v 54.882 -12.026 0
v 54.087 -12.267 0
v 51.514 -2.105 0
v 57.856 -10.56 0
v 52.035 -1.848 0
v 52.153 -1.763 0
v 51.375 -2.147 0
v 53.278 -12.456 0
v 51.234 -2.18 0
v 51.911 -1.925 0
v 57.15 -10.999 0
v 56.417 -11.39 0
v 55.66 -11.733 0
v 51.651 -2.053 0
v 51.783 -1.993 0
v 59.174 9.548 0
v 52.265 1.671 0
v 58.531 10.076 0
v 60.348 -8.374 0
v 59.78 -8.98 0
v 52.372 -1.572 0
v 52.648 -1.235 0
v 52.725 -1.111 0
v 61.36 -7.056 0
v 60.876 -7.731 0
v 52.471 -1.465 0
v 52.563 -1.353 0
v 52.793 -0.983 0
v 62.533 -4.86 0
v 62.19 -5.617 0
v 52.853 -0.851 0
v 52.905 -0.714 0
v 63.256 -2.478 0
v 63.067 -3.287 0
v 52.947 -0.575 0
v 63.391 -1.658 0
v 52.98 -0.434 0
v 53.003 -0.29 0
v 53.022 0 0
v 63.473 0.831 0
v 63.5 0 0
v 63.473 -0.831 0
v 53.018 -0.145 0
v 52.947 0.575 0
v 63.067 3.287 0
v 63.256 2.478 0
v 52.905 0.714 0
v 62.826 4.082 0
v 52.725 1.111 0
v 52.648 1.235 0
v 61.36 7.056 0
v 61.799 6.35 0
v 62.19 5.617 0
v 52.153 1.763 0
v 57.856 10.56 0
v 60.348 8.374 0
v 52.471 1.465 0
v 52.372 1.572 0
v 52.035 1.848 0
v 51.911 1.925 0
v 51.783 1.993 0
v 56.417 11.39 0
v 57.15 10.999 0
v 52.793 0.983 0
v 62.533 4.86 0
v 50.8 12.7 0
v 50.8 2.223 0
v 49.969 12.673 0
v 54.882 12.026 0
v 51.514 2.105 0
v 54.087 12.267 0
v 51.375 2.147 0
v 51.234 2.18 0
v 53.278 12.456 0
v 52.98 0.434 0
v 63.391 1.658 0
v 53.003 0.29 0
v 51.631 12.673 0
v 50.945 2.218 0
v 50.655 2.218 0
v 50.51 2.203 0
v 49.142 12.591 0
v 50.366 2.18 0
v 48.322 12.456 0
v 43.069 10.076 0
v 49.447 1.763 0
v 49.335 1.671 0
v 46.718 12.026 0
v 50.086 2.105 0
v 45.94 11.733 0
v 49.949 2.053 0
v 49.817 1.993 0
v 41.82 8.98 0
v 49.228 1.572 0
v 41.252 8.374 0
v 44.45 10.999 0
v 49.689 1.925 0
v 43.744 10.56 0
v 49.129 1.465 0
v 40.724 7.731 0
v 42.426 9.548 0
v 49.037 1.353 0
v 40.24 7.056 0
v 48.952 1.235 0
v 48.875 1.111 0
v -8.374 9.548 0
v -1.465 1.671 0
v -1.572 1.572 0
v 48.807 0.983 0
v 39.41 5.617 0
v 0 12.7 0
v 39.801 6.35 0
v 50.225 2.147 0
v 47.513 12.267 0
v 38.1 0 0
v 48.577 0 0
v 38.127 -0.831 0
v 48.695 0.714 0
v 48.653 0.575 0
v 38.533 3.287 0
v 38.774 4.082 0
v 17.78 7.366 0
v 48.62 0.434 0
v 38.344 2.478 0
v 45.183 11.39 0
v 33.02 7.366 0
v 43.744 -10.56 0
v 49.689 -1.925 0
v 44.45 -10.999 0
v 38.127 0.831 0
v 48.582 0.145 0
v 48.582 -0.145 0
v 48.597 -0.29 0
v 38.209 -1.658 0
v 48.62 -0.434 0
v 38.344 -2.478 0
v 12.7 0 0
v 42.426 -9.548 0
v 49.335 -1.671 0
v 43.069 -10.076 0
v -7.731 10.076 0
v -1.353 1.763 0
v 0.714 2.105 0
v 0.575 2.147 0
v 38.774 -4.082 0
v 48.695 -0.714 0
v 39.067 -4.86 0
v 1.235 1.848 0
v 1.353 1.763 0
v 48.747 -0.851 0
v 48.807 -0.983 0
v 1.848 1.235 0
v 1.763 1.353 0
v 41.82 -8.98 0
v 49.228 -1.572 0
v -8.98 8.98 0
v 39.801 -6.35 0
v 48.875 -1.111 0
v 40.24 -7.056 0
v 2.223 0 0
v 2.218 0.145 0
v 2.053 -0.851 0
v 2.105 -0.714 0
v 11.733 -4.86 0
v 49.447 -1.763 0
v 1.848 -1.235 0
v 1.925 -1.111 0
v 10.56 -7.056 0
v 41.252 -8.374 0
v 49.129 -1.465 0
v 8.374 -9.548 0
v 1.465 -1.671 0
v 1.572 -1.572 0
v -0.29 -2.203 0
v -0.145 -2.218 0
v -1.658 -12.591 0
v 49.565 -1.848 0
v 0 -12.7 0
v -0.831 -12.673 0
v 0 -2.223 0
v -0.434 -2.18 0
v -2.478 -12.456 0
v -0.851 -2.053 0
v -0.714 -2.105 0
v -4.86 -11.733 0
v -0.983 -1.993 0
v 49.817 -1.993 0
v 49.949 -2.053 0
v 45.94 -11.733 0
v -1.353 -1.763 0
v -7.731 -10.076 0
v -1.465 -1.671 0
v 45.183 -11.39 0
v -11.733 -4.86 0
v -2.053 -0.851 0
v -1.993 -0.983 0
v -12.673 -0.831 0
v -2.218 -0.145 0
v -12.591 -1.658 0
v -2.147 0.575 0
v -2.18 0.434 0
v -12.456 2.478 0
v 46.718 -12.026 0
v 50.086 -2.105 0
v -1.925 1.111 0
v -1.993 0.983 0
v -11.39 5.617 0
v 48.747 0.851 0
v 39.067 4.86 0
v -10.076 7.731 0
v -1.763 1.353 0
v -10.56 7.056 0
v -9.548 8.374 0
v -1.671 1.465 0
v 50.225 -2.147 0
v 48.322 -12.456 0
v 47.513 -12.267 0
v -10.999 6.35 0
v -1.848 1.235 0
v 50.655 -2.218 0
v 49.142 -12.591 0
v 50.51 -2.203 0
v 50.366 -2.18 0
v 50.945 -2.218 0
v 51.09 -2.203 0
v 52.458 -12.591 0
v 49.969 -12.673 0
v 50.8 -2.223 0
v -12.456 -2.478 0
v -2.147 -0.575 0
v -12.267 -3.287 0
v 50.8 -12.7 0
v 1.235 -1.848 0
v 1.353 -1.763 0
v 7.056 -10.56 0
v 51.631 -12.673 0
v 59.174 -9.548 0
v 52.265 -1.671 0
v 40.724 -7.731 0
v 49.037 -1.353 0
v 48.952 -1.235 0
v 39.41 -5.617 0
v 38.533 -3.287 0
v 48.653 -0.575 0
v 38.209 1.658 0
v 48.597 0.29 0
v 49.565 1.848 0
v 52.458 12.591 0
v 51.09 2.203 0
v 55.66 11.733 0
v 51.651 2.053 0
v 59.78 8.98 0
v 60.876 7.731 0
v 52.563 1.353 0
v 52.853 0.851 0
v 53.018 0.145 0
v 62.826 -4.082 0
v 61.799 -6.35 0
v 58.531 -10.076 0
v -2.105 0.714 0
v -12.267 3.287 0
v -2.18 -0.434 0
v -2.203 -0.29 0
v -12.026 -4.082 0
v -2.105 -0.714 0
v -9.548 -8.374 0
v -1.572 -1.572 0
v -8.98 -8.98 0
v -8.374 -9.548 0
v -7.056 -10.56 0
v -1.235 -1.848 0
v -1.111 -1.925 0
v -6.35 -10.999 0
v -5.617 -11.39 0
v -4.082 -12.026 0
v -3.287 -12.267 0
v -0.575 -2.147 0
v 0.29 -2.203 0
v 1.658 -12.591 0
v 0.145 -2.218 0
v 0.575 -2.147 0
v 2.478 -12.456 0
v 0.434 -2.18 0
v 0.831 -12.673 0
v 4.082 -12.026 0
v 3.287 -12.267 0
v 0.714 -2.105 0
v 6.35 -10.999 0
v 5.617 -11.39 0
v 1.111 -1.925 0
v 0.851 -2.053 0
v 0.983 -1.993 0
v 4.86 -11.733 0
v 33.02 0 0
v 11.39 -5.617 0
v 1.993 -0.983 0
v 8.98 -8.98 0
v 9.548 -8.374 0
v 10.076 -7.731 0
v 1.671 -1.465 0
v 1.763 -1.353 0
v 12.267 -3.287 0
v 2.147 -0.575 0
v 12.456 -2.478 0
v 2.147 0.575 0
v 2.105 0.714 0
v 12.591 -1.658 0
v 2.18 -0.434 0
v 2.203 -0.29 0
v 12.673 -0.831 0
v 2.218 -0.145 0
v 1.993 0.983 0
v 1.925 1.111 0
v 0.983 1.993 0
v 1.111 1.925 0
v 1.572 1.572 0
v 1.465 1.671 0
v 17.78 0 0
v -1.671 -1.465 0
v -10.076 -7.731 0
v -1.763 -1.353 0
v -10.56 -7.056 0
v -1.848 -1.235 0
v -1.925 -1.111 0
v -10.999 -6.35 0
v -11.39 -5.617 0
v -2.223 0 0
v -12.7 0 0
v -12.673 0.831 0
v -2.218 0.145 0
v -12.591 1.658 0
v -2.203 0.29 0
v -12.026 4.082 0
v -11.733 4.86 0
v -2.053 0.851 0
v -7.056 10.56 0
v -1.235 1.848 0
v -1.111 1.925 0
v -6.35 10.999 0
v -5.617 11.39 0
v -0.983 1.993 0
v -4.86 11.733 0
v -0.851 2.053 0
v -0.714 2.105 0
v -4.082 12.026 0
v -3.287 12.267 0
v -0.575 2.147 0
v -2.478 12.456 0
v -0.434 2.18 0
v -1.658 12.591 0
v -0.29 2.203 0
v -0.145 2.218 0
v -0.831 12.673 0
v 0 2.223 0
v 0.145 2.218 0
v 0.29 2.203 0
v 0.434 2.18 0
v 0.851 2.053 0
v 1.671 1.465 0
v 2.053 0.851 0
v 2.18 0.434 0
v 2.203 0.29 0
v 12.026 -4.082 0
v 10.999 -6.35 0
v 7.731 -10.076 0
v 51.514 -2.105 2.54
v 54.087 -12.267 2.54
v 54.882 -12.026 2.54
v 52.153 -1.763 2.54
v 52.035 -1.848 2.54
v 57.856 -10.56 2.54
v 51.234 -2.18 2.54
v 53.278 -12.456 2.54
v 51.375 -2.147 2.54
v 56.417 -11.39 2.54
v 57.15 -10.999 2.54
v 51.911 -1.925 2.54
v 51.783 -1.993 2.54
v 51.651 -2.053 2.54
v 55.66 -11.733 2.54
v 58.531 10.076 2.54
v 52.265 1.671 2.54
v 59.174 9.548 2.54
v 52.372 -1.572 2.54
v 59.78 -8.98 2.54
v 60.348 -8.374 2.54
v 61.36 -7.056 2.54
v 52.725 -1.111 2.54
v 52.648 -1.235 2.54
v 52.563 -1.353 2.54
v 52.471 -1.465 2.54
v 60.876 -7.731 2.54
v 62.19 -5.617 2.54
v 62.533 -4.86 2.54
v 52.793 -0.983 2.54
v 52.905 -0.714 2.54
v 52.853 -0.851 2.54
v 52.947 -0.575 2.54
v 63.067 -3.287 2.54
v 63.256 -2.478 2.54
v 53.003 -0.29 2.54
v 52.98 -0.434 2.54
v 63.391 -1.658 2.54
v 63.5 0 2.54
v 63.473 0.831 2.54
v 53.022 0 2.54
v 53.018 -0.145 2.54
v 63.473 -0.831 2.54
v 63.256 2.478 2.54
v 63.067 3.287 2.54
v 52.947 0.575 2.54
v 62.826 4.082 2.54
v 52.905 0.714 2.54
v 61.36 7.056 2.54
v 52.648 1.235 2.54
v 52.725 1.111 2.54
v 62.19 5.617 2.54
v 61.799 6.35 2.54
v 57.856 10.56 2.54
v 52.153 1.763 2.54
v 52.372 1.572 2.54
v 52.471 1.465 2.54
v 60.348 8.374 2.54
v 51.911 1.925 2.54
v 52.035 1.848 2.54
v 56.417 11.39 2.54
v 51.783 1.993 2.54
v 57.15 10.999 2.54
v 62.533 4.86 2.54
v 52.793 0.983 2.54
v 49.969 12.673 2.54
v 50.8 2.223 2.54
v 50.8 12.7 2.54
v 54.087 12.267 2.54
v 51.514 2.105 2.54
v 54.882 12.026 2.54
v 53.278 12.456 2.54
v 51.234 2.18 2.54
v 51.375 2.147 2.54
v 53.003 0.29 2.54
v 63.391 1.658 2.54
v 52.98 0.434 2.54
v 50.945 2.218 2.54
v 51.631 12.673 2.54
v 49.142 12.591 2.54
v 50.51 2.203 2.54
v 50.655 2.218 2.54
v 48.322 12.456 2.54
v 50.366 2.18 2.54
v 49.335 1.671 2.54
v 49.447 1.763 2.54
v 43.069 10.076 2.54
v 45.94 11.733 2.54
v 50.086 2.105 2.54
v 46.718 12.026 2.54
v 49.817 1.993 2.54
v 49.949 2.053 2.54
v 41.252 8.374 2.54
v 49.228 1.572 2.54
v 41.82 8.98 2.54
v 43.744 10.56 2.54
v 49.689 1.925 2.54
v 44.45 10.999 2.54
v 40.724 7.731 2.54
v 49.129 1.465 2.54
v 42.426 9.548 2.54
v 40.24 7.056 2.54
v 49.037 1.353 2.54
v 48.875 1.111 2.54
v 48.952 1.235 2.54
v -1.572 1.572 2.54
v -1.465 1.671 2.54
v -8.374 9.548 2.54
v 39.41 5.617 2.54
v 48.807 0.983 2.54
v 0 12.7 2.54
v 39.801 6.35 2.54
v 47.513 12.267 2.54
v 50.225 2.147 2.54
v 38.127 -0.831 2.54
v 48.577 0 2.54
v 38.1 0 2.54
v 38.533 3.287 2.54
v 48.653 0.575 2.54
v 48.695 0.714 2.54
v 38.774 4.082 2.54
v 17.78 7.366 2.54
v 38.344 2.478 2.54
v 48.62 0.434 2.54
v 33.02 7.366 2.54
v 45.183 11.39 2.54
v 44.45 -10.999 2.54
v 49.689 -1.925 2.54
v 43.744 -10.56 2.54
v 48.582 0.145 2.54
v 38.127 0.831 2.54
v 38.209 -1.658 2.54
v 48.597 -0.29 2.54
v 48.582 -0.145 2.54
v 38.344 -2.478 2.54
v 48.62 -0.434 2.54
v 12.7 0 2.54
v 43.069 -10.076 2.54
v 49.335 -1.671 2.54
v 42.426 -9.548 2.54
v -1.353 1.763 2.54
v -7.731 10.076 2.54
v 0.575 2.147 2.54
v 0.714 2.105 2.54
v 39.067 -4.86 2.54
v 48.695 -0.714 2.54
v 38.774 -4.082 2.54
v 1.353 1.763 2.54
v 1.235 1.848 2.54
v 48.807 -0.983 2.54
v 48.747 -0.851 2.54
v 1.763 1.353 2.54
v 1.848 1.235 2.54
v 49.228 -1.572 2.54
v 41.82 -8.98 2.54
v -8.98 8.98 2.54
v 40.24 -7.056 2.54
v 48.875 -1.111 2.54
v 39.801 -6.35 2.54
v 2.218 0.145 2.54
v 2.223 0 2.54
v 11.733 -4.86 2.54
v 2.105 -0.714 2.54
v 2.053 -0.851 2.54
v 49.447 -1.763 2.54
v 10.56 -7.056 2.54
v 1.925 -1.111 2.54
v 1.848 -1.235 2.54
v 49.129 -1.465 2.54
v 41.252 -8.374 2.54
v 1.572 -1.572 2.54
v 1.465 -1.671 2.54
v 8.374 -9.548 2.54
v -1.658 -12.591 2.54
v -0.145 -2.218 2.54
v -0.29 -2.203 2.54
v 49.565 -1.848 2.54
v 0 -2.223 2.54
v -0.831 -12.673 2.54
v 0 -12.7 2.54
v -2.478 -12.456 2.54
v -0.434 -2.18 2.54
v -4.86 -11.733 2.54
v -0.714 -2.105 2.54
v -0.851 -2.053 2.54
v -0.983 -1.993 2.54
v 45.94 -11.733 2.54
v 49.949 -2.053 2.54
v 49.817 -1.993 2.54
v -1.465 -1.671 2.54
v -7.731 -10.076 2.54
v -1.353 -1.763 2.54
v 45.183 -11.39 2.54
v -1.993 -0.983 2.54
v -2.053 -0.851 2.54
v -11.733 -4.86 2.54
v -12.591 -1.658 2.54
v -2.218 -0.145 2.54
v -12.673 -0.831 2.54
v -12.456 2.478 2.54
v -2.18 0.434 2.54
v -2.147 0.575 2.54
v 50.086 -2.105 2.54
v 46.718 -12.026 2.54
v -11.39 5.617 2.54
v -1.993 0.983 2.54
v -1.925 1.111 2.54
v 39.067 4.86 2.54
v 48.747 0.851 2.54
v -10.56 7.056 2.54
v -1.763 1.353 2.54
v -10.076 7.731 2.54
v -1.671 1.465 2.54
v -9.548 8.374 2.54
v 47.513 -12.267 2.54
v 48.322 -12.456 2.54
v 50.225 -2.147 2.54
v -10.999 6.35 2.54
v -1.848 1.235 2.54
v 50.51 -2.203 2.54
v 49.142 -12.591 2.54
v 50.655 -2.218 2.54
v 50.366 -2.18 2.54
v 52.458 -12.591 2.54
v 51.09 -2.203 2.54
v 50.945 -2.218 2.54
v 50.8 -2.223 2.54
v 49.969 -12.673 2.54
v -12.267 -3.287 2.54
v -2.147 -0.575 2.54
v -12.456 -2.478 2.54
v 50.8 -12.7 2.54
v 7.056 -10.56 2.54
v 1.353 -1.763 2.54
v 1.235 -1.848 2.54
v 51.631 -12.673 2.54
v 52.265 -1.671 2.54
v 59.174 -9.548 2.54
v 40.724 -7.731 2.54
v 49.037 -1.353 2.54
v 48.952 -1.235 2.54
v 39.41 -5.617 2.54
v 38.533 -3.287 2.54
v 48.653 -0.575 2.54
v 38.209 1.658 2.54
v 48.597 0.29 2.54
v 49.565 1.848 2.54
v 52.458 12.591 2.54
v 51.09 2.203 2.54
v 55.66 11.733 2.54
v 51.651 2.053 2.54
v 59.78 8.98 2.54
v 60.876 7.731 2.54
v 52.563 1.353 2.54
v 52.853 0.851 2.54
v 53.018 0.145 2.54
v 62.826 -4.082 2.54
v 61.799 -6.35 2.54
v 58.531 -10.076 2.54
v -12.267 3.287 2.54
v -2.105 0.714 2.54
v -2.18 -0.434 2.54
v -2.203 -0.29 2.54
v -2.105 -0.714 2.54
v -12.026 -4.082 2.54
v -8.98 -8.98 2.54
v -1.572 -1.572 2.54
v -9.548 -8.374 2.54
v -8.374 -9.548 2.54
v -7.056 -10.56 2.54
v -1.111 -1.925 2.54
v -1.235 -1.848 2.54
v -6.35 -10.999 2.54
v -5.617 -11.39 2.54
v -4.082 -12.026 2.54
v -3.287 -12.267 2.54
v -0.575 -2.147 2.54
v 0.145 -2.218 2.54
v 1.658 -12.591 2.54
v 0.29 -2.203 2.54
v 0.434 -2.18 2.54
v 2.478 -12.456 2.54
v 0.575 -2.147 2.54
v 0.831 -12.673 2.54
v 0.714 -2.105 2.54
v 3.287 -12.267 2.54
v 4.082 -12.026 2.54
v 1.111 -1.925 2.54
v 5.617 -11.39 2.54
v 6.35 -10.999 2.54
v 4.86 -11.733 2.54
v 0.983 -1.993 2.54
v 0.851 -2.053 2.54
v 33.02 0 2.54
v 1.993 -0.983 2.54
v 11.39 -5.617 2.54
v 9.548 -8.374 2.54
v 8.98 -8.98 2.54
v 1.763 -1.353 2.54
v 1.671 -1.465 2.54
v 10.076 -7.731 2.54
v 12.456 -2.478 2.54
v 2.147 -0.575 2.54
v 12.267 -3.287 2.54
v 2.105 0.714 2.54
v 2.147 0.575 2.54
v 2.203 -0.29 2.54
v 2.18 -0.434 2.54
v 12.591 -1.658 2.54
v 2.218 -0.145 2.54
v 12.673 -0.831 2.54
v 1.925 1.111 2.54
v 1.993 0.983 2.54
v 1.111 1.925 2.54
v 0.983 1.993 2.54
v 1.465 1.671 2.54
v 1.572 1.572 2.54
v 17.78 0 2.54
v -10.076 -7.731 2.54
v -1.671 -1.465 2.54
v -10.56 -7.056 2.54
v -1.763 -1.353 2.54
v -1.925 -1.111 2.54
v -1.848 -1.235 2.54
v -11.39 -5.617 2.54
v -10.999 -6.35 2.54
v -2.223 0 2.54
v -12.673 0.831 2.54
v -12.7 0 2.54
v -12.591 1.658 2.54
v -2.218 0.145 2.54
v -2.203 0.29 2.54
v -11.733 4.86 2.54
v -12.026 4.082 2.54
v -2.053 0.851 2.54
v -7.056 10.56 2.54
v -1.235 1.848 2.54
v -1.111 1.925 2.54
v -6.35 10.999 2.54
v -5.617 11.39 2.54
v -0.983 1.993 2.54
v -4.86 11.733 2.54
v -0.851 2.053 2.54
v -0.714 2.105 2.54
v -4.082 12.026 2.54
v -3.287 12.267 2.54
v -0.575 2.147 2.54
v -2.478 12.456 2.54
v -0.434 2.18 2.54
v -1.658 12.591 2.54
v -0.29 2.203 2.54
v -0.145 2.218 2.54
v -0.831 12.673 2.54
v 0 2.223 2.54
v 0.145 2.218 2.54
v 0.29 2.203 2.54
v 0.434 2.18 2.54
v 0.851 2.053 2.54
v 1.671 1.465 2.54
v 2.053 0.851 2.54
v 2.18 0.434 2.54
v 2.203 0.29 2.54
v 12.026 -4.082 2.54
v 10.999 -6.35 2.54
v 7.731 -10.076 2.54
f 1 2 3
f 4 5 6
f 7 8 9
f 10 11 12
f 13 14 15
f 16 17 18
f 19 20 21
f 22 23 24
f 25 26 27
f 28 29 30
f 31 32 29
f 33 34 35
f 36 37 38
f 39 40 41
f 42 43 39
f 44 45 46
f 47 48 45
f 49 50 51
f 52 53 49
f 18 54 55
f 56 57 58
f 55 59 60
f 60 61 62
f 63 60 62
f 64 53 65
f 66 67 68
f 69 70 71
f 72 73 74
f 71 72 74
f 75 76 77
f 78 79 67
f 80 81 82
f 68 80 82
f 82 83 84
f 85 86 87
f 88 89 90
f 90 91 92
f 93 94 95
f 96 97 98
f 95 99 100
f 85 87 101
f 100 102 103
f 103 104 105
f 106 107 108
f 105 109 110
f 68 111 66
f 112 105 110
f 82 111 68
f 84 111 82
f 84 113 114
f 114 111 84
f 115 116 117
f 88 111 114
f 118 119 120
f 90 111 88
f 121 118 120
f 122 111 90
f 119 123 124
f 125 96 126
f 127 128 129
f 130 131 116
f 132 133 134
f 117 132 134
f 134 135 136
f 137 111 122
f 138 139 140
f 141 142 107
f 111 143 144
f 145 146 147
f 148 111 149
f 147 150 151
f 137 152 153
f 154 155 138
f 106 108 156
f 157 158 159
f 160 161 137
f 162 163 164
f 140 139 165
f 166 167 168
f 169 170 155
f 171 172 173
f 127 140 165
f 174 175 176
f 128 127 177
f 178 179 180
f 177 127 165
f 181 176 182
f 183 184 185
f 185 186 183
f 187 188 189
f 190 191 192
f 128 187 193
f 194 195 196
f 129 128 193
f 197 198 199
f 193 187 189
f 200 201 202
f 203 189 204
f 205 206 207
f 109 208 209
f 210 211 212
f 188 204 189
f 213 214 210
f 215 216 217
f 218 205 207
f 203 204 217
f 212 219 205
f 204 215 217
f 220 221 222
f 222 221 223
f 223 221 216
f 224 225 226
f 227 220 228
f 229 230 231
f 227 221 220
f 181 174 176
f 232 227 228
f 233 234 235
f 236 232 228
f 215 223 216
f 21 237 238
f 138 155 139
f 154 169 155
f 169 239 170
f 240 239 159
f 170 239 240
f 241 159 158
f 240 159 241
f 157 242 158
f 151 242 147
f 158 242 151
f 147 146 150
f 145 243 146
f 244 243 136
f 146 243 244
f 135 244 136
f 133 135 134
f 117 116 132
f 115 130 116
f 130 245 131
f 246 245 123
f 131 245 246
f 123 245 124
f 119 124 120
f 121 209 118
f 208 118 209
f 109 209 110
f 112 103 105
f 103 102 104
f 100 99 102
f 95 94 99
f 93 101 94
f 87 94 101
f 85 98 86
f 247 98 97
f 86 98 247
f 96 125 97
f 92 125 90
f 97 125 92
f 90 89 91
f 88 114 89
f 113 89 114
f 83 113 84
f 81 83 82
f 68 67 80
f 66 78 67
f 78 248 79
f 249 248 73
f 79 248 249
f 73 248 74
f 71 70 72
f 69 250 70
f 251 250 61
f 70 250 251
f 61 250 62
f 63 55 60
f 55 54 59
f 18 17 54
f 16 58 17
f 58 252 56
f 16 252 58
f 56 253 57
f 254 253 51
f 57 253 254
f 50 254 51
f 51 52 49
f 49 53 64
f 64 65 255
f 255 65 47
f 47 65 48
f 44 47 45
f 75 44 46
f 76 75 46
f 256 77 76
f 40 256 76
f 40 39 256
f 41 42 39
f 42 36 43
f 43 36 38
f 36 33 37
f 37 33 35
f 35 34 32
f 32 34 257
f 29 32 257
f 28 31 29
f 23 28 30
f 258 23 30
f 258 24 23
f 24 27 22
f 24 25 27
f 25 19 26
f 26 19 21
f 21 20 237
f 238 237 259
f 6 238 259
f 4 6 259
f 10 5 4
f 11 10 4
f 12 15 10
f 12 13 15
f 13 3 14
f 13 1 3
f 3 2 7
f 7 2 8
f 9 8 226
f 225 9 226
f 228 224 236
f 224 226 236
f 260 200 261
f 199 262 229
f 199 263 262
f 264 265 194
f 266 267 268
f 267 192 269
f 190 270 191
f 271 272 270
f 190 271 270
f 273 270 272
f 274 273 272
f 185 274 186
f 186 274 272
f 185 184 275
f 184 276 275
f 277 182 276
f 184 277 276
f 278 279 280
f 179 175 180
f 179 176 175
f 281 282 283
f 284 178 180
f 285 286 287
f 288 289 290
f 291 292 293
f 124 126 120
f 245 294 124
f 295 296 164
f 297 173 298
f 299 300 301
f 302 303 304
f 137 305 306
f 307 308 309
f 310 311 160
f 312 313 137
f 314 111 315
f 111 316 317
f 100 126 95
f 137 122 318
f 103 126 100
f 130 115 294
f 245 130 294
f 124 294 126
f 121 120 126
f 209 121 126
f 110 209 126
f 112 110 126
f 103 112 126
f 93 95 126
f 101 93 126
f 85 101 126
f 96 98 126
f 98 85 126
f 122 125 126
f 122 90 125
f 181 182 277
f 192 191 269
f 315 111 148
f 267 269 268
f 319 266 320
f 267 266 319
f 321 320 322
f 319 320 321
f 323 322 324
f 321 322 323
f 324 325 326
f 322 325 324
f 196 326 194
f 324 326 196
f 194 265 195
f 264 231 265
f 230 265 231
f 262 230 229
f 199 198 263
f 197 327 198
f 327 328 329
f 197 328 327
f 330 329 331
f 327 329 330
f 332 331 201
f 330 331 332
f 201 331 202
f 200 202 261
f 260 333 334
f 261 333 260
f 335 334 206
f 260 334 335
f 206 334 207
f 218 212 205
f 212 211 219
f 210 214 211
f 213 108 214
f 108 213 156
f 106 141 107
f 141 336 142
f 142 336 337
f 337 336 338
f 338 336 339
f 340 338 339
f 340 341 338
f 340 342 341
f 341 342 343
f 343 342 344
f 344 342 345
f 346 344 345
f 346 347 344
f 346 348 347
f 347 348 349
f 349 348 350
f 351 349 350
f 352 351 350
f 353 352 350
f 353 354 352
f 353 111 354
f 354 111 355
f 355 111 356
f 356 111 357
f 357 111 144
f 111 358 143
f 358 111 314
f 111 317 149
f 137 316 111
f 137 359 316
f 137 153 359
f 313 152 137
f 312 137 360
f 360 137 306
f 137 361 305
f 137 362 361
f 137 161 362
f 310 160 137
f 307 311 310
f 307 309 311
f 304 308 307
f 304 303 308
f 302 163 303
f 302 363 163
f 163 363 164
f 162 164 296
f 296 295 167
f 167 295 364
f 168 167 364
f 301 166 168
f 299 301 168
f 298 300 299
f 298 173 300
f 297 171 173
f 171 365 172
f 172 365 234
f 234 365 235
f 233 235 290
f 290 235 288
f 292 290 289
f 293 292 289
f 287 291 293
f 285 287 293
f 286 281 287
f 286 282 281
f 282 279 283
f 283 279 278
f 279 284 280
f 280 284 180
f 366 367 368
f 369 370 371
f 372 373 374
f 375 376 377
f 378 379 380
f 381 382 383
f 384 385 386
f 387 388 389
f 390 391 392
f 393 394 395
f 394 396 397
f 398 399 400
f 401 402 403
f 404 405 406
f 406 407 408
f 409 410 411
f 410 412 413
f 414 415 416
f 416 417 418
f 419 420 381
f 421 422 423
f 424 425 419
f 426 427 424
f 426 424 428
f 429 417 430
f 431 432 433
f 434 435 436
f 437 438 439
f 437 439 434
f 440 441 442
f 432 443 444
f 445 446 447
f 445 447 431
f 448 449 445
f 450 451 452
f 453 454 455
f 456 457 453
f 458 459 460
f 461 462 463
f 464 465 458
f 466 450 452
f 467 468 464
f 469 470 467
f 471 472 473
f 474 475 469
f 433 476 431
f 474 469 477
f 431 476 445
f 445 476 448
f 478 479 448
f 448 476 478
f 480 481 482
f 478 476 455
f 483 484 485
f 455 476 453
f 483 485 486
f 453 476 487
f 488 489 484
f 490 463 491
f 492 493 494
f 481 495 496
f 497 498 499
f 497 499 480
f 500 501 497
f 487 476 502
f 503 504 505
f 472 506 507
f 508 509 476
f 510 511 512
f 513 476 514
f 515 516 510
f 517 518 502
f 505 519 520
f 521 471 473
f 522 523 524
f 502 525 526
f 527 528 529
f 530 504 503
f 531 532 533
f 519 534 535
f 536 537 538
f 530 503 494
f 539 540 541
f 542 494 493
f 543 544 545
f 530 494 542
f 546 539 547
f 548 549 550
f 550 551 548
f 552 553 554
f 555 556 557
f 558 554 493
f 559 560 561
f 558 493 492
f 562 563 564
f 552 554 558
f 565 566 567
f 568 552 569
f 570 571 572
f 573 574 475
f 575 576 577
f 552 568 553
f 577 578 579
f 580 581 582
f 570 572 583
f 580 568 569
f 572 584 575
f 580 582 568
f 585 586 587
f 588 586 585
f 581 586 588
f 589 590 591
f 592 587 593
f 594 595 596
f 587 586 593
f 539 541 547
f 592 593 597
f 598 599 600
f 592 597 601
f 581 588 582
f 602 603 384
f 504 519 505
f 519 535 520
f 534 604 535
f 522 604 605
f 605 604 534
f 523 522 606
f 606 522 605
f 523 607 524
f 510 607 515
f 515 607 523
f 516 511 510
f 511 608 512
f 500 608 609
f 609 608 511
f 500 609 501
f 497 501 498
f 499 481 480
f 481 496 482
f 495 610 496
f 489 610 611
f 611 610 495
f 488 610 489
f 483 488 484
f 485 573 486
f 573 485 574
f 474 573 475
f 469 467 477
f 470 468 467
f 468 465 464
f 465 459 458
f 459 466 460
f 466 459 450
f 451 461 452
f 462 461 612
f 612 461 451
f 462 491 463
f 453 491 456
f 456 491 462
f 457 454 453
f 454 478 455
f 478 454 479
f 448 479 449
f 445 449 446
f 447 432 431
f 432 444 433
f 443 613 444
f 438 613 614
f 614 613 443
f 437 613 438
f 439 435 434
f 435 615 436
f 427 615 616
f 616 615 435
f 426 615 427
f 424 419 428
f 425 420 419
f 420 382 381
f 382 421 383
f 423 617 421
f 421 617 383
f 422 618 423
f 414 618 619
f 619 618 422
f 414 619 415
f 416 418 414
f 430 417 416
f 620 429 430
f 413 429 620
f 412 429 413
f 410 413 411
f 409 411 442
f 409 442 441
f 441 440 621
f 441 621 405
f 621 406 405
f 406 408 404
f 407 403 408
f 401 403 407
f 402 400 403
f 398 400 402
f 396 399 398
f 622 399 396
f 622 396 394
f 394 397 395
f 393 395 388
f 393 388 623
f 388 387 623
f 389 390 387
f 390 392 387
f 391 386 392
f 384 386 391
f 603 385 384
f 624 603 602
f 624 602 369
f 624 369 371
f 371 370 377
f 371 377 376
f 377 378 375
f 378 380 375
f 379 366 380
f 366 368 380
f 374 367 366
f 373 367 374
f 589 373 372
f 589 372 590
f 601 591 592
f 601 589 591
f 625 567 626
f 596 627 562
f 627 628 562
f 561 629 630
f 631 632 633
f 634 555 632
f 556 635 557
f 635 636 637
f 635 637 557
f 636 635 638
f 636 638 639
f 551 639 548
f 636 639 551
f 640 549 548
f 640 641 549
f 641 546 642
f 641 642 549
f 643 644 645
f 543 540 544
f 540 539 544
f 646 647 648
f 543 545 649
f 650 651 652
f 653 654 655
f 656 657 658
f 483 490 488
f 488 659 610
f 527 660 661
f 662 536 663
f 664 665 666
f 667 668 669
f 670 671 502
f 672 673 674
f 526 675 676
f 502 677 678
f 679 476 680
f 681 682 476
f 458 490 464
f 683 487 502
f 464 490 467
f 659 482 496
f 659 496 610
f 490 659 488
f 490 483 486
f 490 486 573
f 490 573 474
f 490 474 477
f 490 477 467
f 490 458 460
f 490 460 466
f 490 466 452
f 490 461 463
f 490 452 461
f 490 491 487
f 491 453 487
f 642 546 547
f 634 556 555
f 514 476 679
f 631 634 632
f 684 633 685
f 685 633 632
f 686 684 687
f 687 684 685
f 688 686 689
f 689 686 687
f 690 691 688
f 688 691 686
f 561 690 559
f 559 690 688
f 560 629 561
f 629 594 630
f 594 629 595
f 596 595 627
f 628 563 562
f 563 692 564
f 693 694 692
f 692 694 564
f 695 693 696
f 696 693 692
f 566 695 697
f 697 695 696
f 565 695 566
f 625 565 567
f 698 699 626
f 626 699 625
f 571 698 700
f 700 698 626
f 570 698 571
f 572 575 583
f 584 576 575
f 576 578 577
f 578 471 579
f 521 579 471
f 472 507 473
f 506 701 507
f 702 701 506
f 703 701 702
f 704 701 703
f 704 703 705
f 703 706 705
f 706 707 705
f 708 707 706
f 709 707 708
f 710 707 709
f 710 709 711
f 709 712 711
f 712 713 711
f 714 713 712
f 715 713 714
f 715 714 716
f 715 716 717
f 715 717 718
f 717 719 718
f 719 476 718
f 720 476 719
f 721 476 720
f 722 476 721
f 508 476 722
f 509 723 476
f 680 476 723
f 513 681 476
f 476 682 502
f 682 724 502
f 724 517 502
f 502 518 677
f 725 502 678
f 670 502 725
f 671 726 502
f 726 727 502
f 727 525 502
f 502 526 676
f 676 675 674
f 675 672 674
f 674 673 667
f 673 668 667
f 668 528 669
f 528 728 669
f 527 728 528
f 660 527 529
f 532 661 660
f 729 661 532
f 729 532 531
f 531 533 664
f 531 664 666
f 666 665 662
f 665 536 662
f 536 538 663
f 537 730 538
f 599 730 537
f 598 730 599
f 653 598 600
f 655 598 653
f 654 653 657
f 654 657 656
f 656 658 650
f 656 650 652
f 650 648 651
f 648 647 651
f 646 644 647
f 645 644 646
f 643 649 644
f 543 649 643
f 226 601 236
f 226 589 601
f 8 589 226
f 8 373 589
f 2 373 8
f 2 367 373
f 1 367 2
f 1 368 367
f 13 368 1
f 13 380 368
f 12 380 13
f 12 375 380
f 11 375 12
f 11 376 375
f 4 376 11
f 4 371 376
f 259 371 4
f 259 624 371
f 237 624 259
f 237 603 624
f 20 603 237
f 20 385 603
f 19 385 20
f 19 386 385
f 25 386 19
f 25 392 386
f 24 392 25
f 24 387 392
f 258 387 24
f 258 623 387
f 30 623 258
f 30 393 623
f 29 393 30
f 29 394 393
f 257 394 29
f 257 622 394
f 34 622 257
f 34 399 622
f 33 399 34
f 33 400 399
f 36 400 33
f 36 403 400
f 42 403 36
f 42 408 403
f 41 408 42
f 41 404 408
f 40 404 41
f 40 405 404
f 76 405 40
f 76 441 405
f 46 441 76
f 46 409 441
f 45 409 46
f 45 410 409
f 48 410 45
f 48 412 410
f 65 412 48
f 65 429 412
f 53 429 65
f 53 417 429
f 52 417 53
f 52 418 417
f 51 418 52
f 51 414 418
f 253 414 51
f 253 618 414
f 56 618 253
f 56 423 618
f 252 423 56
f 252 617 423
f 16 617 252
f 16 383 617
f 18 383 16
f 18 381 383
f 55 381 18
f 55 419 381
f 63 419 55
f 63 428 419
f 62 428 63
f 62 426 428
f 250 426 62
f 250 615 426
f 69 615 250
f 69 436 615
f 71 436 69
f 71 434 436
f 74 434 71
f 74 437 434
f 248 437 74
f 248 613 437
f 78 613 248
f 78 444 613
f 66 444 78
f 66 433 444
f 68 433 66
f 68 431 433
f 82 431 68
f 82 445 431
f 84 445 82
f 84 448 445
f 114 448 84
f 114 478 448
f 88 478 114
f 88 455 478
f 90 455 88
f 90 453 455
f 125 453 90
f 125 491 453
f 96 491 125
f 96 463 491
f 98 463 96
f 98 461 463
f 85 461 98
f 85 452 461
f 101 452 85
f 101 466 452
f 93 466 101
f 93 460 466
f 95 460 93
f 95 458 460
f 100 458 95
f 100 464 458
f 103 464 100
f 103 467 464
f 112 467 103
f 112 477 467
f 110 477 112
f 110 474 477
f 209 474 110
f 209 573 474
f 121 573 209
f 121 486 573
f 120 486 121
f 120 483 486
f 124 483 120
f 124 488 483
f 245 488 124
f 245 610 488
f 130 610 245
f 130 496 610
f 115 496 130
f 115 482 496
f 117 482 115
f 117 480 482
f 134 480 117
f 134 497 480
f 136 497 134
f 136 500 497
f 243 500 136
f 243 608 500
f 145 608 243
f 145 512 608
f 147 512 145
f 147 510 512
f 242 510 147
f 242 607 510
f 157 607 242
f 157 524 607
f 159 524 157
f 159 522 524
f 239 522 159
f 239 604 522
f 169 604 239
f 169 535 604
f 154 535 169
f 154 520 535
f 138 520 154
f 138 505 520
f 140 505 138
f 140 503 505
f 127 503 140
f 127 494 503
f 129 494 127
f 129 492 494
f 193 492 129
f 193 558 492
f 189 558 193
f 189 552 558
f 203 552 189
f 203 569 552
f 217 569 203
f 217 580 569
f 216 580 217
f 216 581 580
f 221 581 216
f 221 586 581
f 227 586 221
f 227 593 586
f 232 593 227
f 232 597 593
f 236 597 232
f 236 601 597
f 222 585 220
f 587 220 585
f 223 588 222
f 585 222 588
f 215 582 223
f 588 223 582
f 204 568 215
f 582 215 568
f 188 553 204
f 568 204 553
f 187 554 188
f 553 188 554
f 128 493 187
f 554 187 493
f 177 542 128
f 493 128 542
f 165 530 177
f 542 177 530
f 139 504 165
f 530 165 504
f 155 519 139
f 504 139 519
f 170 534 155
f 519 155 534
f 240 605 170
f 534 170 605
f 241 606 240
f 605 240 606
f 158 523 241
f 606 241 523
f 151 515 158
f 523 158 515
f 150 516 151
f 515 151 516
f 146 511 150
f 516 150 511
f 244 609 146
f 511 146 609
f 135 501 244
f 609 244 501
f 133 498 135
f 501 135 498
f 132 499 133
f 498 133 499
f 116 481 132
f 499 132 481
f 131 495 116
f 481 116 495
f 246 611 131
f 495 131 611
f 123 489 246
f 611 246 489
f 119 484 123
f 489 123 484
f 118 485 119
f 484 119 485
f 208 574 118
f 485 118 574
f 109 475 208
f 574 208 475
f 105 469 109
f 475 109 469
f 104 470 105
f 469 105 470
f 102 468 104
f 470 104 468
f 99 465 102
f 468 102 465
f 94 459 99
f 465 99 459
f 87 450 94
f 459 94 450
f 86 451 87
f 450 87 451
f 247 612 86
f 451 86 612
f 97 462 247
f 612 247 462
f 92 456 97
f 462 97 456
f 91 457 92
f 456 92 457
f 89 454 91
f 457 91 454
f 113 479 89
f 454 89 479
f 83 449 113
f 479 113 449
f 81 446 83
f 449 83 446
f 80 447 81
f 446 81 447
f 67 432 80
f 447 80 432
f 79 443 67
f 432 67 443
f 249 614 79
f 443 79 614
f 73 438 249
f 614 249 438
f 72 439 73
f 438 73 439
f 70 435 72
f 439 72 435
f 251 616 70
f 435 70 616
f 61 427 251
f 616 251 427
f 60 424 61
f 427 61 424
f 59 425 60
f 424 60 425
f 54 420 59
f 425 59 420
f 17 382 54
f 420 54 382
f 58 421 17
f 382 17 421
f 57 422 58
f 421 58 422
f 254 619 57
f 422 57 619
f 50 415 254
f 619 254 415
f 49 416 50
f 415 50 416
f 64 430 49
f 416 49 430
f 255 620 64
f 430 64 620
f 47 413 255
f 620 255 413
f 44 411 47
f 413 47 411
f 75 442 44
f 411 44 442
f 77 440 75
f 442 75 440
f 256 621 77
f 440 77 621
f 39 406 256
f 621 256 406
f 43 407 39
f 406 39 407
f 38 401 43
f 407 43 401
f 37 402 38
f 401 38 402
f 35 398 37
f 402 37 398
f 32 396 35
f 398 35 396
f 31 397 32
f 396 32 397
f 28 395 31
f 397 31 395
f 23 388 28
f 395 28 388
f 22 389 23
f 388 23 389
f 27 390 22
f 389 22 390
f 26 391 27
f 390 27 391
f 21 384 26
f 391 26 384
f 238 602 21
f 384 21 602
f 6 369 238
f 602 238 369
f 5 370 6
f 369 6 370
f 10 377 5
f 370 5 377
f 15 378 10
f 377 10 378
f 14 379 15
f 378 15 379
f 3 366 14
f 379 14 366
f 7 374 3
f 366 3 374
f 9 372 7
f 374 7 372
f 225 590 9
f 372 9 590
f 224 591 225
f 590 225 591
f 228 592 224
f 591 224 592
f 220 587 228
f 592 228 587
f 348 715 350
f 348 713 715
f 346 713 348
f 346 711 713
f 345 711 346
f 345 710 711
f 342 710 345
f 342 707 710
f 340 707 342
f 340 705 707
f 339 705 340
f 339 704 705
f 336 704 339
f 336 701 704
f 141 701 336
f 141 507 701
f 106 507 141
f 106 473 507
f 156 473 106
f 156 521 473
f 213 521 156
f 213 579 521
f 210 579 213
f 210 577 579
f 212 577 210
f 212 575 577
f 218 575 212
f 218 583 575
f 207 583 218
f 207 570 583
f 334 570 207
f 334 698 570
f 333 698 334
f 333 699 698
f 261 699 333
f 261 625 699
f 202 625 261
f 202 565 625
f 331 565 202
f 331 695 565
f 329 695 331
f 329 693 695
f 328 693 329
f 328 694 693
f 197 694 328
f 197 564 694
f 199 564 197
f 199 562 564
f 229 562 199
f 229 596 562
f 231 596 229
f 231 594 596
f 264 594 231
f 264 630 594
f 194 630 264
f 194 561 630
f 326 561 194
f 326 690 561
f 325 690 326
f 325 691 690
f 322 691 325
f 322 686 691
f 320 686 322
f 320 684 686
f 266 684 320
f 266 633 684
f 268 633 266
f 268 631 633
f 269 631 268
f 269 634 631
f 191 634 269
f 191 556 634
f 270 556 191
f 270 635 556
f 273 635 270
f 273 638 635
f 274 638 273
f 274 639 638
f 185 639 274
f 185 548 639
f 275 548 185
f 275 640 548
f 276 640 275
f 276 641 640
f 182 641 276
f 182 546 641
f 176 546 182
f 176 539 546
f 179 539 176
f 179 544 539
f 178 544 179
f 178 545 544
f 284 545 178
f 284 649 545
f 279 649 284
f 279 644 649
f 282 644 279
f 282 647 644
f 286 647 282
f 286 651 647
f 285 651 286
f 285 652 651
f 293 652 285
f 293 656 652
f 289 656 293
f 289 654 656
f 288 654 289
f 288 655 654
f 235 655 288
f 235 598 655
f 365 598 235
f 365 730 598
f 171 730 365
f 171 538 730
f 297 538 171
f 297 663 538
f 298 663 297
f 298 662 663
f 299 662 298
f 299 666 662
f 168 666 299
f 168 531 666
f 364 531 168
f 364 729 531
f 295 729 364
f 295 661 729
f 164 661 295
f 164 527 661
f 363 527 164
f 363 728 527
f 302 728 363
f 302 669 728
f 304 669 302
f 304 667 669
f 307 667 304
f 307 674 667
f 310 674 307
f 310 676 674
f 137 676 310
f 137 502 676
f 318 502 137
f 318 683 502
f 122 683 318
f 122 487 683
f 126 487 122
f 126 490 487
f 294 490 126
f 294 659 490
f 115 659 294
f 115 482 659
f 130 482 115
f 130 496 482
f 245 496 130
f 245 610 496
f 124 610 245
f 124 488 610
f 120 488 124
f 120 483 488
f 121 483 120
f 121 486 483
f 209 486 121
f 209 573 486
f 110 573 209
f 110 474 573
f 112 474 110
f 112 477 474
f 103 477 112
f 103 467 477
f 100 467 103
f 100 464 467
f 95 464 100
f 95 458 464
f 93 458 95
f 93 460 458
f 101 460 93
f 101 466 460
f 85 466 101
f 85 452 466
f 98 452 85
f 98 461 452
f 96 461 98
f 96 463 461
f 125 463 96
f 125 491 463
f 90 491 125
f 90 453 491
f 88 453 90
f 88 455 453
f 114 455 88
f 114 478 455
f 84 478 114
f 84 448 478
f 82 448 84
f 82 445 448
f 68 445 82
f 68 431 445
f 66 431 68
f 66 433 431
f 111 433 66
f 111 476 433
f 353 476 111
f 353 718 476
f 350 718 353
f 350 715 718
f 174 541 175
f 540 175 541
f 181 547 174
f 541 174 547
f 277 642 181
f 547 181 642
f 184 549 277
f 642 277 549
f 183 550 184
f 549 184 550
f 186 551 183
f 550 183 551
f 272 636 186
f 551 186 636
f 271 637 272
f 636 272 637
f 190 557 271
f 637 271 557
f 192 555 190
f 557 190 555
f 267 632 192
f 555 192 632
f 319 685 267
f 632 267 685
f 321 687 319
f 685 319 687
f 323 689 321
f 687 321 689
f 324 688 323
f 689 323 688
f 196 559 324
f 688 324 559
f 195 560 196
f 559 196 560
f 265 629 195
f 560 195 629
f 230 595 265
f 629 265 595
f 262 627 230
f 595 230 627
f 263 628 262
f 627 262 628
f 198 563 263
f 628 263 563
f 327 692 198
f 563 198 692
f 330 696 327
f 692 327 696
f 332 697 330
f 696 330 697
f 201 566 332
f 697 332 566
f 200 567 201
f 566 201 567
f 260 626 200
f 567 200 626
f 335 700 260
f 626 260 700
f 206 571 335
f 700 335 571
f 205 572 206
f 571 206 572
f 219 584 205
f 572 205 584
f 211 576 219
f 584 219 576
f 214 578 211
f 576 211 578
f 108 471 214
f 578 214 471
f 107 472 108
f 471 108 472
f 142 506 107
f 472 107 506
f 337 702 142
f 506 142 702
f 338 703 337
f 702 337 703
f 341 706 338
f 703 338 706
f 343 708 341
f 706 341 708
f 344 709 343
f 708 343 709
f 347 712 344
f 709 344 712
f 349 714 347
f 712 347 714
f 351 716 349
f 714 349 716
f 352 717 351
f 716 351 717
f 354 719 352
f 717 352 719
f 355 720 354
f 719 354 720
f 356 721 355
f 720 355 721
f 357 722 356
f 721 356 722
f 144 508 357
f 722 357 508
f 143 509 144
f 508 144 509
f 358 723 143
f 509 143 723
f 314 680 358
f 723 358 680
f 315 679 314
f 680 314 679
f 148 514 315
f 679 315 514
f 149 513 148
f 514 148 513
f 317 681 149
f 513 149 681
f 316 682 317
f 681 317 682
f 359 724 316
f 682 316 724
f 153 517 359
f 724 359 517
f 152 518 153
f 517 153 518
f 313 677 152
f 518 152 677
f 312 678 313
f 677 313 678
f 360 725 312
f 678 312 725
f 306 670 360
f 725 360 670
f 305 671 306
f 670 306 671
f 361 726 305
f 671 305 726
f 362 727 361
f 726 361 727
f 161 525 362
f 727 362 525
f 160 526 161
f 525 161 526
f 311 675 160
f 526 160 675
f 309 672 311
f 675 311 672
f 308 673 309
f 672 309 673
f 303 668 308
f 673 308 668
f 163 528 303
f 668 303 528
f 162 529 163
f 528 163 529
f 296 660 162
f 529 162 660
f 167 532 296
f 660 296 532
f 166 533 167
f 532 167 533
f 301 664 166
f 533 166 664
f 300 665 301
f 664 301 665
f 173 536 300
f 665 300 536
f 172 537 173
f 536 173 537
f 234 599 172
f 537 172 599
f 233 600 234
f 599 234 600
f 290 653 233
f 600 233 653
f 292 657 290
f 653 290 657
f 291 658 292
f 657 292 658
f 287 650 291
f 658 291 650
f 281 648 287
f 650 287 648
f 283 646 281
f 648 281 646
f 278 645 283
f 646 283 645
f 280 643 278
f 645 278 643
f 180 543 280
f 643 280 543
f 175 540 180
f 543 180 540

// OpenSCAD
ViewScale = [0.0254, 0.0254, 0.0254];

LEDTILT=25;

module onesupport()
{
    difference() {
    circle(500, $fn=96);
//    circle(400, $fn=96);
//    }
//
//    difference() {
//    circle(200, $fn=96);
   circle(175/2, $fn=96); }

//    difference() {
//        union() {
//            square([100, 1000], center=true);
//            rotate([0, 0, 90])
//            square([100, 1000], center=true);
//        }
//        circle(175/2, $fn=96);
//    }
}

module support()
{
    linear_extrude(100) {
        onesupport();
        translate([2000, 0, 0])
        onesupport();
        difference() {
            square([2000, 500]);
            circle(500, $fn=96);
            translate([2000, 0, 0])
            circle(500, $fn=96);
            translate([700, -10, 0])
            square([600, 300]);
        }
    }
}

module cutsupport()
{
    rotate([0, 90, 0])
    linear_extrude(100) {
        difference() {
        square([500, 500], center=true);
        translate([110, 0, 0])
        rotate([0, 0, LEDTILT])
        translate([-90, 0, 0])
        square([800, 120], center=true);
        rotate([0, 0, LEDTILT])
        translate([0, 300, 0])
        square([600, 300], center=true);
        }
    }
}

module ledmount()
{
    // full square
    translate([0, 0, 500])
    linear_extrude(150)
    difference() {
        square([1080+10, 1080+10], center=true);
        square([880+10, 880+10], center=true);
        *translate([0, 450, 0])
        square([200, 200], center=true);
    }

    // supports
    move = 940/2+25;
    translate([0, 0, 150+500]) 
    linear_extrude(200) {
        translate([move, move, 0])
        square([100, 100], center=true);
        translate([-move, move, 0])
        square([100, 100], center=true);
        translate([-move, -move, 0])
        square([100, 100], center=true);
        translate([move, -move, 0])
        square([100, 100], center=true);
        *translate([-150, move, 0])
        square([100, 100], center=true);
        *translate([150, move, 0])
        square([100, 100], center=true);
    }

    // cutout square
    translate([0, 0, 350+500])
    linear_extrude(100)
    difference() {
        square([1080+10, 1080+10], center=true);
        square([880+10, 880+10], center=true);
        //translate([0, 450, 0])
        //square([200, 200], center=true);
    }

    // long supports
    translate([-move-50,0, 450+500+250]) 
    cutsupport();
    translate([move-50,0, 450+500+250]) 
    cutsupport();
//    linear_extrude(500) {
//        translate([move, -100, 0])
//        square([100, 500], center=true);
//        translate([-move, -100, 0])
//        square([100, 500], center=true);
//    }

    *translate([0, -move+195, 800+500])
    linear_extrude(600)
    square([1080+10, 100], center=true);
}

module twopieces()
{
    translate([-1000, 0, 0])
    support();
    rotate([-LEDTILT, 0, 0])
    translate([0, -1200, 0])
    rotate([-90, 0, 0])
    ledmount();
}

module onepiece()
{
    support();
    //translate([0, -1200, 0])
    *ledmount();
}

scale(ViewScale)
{
    onepiece();
}
